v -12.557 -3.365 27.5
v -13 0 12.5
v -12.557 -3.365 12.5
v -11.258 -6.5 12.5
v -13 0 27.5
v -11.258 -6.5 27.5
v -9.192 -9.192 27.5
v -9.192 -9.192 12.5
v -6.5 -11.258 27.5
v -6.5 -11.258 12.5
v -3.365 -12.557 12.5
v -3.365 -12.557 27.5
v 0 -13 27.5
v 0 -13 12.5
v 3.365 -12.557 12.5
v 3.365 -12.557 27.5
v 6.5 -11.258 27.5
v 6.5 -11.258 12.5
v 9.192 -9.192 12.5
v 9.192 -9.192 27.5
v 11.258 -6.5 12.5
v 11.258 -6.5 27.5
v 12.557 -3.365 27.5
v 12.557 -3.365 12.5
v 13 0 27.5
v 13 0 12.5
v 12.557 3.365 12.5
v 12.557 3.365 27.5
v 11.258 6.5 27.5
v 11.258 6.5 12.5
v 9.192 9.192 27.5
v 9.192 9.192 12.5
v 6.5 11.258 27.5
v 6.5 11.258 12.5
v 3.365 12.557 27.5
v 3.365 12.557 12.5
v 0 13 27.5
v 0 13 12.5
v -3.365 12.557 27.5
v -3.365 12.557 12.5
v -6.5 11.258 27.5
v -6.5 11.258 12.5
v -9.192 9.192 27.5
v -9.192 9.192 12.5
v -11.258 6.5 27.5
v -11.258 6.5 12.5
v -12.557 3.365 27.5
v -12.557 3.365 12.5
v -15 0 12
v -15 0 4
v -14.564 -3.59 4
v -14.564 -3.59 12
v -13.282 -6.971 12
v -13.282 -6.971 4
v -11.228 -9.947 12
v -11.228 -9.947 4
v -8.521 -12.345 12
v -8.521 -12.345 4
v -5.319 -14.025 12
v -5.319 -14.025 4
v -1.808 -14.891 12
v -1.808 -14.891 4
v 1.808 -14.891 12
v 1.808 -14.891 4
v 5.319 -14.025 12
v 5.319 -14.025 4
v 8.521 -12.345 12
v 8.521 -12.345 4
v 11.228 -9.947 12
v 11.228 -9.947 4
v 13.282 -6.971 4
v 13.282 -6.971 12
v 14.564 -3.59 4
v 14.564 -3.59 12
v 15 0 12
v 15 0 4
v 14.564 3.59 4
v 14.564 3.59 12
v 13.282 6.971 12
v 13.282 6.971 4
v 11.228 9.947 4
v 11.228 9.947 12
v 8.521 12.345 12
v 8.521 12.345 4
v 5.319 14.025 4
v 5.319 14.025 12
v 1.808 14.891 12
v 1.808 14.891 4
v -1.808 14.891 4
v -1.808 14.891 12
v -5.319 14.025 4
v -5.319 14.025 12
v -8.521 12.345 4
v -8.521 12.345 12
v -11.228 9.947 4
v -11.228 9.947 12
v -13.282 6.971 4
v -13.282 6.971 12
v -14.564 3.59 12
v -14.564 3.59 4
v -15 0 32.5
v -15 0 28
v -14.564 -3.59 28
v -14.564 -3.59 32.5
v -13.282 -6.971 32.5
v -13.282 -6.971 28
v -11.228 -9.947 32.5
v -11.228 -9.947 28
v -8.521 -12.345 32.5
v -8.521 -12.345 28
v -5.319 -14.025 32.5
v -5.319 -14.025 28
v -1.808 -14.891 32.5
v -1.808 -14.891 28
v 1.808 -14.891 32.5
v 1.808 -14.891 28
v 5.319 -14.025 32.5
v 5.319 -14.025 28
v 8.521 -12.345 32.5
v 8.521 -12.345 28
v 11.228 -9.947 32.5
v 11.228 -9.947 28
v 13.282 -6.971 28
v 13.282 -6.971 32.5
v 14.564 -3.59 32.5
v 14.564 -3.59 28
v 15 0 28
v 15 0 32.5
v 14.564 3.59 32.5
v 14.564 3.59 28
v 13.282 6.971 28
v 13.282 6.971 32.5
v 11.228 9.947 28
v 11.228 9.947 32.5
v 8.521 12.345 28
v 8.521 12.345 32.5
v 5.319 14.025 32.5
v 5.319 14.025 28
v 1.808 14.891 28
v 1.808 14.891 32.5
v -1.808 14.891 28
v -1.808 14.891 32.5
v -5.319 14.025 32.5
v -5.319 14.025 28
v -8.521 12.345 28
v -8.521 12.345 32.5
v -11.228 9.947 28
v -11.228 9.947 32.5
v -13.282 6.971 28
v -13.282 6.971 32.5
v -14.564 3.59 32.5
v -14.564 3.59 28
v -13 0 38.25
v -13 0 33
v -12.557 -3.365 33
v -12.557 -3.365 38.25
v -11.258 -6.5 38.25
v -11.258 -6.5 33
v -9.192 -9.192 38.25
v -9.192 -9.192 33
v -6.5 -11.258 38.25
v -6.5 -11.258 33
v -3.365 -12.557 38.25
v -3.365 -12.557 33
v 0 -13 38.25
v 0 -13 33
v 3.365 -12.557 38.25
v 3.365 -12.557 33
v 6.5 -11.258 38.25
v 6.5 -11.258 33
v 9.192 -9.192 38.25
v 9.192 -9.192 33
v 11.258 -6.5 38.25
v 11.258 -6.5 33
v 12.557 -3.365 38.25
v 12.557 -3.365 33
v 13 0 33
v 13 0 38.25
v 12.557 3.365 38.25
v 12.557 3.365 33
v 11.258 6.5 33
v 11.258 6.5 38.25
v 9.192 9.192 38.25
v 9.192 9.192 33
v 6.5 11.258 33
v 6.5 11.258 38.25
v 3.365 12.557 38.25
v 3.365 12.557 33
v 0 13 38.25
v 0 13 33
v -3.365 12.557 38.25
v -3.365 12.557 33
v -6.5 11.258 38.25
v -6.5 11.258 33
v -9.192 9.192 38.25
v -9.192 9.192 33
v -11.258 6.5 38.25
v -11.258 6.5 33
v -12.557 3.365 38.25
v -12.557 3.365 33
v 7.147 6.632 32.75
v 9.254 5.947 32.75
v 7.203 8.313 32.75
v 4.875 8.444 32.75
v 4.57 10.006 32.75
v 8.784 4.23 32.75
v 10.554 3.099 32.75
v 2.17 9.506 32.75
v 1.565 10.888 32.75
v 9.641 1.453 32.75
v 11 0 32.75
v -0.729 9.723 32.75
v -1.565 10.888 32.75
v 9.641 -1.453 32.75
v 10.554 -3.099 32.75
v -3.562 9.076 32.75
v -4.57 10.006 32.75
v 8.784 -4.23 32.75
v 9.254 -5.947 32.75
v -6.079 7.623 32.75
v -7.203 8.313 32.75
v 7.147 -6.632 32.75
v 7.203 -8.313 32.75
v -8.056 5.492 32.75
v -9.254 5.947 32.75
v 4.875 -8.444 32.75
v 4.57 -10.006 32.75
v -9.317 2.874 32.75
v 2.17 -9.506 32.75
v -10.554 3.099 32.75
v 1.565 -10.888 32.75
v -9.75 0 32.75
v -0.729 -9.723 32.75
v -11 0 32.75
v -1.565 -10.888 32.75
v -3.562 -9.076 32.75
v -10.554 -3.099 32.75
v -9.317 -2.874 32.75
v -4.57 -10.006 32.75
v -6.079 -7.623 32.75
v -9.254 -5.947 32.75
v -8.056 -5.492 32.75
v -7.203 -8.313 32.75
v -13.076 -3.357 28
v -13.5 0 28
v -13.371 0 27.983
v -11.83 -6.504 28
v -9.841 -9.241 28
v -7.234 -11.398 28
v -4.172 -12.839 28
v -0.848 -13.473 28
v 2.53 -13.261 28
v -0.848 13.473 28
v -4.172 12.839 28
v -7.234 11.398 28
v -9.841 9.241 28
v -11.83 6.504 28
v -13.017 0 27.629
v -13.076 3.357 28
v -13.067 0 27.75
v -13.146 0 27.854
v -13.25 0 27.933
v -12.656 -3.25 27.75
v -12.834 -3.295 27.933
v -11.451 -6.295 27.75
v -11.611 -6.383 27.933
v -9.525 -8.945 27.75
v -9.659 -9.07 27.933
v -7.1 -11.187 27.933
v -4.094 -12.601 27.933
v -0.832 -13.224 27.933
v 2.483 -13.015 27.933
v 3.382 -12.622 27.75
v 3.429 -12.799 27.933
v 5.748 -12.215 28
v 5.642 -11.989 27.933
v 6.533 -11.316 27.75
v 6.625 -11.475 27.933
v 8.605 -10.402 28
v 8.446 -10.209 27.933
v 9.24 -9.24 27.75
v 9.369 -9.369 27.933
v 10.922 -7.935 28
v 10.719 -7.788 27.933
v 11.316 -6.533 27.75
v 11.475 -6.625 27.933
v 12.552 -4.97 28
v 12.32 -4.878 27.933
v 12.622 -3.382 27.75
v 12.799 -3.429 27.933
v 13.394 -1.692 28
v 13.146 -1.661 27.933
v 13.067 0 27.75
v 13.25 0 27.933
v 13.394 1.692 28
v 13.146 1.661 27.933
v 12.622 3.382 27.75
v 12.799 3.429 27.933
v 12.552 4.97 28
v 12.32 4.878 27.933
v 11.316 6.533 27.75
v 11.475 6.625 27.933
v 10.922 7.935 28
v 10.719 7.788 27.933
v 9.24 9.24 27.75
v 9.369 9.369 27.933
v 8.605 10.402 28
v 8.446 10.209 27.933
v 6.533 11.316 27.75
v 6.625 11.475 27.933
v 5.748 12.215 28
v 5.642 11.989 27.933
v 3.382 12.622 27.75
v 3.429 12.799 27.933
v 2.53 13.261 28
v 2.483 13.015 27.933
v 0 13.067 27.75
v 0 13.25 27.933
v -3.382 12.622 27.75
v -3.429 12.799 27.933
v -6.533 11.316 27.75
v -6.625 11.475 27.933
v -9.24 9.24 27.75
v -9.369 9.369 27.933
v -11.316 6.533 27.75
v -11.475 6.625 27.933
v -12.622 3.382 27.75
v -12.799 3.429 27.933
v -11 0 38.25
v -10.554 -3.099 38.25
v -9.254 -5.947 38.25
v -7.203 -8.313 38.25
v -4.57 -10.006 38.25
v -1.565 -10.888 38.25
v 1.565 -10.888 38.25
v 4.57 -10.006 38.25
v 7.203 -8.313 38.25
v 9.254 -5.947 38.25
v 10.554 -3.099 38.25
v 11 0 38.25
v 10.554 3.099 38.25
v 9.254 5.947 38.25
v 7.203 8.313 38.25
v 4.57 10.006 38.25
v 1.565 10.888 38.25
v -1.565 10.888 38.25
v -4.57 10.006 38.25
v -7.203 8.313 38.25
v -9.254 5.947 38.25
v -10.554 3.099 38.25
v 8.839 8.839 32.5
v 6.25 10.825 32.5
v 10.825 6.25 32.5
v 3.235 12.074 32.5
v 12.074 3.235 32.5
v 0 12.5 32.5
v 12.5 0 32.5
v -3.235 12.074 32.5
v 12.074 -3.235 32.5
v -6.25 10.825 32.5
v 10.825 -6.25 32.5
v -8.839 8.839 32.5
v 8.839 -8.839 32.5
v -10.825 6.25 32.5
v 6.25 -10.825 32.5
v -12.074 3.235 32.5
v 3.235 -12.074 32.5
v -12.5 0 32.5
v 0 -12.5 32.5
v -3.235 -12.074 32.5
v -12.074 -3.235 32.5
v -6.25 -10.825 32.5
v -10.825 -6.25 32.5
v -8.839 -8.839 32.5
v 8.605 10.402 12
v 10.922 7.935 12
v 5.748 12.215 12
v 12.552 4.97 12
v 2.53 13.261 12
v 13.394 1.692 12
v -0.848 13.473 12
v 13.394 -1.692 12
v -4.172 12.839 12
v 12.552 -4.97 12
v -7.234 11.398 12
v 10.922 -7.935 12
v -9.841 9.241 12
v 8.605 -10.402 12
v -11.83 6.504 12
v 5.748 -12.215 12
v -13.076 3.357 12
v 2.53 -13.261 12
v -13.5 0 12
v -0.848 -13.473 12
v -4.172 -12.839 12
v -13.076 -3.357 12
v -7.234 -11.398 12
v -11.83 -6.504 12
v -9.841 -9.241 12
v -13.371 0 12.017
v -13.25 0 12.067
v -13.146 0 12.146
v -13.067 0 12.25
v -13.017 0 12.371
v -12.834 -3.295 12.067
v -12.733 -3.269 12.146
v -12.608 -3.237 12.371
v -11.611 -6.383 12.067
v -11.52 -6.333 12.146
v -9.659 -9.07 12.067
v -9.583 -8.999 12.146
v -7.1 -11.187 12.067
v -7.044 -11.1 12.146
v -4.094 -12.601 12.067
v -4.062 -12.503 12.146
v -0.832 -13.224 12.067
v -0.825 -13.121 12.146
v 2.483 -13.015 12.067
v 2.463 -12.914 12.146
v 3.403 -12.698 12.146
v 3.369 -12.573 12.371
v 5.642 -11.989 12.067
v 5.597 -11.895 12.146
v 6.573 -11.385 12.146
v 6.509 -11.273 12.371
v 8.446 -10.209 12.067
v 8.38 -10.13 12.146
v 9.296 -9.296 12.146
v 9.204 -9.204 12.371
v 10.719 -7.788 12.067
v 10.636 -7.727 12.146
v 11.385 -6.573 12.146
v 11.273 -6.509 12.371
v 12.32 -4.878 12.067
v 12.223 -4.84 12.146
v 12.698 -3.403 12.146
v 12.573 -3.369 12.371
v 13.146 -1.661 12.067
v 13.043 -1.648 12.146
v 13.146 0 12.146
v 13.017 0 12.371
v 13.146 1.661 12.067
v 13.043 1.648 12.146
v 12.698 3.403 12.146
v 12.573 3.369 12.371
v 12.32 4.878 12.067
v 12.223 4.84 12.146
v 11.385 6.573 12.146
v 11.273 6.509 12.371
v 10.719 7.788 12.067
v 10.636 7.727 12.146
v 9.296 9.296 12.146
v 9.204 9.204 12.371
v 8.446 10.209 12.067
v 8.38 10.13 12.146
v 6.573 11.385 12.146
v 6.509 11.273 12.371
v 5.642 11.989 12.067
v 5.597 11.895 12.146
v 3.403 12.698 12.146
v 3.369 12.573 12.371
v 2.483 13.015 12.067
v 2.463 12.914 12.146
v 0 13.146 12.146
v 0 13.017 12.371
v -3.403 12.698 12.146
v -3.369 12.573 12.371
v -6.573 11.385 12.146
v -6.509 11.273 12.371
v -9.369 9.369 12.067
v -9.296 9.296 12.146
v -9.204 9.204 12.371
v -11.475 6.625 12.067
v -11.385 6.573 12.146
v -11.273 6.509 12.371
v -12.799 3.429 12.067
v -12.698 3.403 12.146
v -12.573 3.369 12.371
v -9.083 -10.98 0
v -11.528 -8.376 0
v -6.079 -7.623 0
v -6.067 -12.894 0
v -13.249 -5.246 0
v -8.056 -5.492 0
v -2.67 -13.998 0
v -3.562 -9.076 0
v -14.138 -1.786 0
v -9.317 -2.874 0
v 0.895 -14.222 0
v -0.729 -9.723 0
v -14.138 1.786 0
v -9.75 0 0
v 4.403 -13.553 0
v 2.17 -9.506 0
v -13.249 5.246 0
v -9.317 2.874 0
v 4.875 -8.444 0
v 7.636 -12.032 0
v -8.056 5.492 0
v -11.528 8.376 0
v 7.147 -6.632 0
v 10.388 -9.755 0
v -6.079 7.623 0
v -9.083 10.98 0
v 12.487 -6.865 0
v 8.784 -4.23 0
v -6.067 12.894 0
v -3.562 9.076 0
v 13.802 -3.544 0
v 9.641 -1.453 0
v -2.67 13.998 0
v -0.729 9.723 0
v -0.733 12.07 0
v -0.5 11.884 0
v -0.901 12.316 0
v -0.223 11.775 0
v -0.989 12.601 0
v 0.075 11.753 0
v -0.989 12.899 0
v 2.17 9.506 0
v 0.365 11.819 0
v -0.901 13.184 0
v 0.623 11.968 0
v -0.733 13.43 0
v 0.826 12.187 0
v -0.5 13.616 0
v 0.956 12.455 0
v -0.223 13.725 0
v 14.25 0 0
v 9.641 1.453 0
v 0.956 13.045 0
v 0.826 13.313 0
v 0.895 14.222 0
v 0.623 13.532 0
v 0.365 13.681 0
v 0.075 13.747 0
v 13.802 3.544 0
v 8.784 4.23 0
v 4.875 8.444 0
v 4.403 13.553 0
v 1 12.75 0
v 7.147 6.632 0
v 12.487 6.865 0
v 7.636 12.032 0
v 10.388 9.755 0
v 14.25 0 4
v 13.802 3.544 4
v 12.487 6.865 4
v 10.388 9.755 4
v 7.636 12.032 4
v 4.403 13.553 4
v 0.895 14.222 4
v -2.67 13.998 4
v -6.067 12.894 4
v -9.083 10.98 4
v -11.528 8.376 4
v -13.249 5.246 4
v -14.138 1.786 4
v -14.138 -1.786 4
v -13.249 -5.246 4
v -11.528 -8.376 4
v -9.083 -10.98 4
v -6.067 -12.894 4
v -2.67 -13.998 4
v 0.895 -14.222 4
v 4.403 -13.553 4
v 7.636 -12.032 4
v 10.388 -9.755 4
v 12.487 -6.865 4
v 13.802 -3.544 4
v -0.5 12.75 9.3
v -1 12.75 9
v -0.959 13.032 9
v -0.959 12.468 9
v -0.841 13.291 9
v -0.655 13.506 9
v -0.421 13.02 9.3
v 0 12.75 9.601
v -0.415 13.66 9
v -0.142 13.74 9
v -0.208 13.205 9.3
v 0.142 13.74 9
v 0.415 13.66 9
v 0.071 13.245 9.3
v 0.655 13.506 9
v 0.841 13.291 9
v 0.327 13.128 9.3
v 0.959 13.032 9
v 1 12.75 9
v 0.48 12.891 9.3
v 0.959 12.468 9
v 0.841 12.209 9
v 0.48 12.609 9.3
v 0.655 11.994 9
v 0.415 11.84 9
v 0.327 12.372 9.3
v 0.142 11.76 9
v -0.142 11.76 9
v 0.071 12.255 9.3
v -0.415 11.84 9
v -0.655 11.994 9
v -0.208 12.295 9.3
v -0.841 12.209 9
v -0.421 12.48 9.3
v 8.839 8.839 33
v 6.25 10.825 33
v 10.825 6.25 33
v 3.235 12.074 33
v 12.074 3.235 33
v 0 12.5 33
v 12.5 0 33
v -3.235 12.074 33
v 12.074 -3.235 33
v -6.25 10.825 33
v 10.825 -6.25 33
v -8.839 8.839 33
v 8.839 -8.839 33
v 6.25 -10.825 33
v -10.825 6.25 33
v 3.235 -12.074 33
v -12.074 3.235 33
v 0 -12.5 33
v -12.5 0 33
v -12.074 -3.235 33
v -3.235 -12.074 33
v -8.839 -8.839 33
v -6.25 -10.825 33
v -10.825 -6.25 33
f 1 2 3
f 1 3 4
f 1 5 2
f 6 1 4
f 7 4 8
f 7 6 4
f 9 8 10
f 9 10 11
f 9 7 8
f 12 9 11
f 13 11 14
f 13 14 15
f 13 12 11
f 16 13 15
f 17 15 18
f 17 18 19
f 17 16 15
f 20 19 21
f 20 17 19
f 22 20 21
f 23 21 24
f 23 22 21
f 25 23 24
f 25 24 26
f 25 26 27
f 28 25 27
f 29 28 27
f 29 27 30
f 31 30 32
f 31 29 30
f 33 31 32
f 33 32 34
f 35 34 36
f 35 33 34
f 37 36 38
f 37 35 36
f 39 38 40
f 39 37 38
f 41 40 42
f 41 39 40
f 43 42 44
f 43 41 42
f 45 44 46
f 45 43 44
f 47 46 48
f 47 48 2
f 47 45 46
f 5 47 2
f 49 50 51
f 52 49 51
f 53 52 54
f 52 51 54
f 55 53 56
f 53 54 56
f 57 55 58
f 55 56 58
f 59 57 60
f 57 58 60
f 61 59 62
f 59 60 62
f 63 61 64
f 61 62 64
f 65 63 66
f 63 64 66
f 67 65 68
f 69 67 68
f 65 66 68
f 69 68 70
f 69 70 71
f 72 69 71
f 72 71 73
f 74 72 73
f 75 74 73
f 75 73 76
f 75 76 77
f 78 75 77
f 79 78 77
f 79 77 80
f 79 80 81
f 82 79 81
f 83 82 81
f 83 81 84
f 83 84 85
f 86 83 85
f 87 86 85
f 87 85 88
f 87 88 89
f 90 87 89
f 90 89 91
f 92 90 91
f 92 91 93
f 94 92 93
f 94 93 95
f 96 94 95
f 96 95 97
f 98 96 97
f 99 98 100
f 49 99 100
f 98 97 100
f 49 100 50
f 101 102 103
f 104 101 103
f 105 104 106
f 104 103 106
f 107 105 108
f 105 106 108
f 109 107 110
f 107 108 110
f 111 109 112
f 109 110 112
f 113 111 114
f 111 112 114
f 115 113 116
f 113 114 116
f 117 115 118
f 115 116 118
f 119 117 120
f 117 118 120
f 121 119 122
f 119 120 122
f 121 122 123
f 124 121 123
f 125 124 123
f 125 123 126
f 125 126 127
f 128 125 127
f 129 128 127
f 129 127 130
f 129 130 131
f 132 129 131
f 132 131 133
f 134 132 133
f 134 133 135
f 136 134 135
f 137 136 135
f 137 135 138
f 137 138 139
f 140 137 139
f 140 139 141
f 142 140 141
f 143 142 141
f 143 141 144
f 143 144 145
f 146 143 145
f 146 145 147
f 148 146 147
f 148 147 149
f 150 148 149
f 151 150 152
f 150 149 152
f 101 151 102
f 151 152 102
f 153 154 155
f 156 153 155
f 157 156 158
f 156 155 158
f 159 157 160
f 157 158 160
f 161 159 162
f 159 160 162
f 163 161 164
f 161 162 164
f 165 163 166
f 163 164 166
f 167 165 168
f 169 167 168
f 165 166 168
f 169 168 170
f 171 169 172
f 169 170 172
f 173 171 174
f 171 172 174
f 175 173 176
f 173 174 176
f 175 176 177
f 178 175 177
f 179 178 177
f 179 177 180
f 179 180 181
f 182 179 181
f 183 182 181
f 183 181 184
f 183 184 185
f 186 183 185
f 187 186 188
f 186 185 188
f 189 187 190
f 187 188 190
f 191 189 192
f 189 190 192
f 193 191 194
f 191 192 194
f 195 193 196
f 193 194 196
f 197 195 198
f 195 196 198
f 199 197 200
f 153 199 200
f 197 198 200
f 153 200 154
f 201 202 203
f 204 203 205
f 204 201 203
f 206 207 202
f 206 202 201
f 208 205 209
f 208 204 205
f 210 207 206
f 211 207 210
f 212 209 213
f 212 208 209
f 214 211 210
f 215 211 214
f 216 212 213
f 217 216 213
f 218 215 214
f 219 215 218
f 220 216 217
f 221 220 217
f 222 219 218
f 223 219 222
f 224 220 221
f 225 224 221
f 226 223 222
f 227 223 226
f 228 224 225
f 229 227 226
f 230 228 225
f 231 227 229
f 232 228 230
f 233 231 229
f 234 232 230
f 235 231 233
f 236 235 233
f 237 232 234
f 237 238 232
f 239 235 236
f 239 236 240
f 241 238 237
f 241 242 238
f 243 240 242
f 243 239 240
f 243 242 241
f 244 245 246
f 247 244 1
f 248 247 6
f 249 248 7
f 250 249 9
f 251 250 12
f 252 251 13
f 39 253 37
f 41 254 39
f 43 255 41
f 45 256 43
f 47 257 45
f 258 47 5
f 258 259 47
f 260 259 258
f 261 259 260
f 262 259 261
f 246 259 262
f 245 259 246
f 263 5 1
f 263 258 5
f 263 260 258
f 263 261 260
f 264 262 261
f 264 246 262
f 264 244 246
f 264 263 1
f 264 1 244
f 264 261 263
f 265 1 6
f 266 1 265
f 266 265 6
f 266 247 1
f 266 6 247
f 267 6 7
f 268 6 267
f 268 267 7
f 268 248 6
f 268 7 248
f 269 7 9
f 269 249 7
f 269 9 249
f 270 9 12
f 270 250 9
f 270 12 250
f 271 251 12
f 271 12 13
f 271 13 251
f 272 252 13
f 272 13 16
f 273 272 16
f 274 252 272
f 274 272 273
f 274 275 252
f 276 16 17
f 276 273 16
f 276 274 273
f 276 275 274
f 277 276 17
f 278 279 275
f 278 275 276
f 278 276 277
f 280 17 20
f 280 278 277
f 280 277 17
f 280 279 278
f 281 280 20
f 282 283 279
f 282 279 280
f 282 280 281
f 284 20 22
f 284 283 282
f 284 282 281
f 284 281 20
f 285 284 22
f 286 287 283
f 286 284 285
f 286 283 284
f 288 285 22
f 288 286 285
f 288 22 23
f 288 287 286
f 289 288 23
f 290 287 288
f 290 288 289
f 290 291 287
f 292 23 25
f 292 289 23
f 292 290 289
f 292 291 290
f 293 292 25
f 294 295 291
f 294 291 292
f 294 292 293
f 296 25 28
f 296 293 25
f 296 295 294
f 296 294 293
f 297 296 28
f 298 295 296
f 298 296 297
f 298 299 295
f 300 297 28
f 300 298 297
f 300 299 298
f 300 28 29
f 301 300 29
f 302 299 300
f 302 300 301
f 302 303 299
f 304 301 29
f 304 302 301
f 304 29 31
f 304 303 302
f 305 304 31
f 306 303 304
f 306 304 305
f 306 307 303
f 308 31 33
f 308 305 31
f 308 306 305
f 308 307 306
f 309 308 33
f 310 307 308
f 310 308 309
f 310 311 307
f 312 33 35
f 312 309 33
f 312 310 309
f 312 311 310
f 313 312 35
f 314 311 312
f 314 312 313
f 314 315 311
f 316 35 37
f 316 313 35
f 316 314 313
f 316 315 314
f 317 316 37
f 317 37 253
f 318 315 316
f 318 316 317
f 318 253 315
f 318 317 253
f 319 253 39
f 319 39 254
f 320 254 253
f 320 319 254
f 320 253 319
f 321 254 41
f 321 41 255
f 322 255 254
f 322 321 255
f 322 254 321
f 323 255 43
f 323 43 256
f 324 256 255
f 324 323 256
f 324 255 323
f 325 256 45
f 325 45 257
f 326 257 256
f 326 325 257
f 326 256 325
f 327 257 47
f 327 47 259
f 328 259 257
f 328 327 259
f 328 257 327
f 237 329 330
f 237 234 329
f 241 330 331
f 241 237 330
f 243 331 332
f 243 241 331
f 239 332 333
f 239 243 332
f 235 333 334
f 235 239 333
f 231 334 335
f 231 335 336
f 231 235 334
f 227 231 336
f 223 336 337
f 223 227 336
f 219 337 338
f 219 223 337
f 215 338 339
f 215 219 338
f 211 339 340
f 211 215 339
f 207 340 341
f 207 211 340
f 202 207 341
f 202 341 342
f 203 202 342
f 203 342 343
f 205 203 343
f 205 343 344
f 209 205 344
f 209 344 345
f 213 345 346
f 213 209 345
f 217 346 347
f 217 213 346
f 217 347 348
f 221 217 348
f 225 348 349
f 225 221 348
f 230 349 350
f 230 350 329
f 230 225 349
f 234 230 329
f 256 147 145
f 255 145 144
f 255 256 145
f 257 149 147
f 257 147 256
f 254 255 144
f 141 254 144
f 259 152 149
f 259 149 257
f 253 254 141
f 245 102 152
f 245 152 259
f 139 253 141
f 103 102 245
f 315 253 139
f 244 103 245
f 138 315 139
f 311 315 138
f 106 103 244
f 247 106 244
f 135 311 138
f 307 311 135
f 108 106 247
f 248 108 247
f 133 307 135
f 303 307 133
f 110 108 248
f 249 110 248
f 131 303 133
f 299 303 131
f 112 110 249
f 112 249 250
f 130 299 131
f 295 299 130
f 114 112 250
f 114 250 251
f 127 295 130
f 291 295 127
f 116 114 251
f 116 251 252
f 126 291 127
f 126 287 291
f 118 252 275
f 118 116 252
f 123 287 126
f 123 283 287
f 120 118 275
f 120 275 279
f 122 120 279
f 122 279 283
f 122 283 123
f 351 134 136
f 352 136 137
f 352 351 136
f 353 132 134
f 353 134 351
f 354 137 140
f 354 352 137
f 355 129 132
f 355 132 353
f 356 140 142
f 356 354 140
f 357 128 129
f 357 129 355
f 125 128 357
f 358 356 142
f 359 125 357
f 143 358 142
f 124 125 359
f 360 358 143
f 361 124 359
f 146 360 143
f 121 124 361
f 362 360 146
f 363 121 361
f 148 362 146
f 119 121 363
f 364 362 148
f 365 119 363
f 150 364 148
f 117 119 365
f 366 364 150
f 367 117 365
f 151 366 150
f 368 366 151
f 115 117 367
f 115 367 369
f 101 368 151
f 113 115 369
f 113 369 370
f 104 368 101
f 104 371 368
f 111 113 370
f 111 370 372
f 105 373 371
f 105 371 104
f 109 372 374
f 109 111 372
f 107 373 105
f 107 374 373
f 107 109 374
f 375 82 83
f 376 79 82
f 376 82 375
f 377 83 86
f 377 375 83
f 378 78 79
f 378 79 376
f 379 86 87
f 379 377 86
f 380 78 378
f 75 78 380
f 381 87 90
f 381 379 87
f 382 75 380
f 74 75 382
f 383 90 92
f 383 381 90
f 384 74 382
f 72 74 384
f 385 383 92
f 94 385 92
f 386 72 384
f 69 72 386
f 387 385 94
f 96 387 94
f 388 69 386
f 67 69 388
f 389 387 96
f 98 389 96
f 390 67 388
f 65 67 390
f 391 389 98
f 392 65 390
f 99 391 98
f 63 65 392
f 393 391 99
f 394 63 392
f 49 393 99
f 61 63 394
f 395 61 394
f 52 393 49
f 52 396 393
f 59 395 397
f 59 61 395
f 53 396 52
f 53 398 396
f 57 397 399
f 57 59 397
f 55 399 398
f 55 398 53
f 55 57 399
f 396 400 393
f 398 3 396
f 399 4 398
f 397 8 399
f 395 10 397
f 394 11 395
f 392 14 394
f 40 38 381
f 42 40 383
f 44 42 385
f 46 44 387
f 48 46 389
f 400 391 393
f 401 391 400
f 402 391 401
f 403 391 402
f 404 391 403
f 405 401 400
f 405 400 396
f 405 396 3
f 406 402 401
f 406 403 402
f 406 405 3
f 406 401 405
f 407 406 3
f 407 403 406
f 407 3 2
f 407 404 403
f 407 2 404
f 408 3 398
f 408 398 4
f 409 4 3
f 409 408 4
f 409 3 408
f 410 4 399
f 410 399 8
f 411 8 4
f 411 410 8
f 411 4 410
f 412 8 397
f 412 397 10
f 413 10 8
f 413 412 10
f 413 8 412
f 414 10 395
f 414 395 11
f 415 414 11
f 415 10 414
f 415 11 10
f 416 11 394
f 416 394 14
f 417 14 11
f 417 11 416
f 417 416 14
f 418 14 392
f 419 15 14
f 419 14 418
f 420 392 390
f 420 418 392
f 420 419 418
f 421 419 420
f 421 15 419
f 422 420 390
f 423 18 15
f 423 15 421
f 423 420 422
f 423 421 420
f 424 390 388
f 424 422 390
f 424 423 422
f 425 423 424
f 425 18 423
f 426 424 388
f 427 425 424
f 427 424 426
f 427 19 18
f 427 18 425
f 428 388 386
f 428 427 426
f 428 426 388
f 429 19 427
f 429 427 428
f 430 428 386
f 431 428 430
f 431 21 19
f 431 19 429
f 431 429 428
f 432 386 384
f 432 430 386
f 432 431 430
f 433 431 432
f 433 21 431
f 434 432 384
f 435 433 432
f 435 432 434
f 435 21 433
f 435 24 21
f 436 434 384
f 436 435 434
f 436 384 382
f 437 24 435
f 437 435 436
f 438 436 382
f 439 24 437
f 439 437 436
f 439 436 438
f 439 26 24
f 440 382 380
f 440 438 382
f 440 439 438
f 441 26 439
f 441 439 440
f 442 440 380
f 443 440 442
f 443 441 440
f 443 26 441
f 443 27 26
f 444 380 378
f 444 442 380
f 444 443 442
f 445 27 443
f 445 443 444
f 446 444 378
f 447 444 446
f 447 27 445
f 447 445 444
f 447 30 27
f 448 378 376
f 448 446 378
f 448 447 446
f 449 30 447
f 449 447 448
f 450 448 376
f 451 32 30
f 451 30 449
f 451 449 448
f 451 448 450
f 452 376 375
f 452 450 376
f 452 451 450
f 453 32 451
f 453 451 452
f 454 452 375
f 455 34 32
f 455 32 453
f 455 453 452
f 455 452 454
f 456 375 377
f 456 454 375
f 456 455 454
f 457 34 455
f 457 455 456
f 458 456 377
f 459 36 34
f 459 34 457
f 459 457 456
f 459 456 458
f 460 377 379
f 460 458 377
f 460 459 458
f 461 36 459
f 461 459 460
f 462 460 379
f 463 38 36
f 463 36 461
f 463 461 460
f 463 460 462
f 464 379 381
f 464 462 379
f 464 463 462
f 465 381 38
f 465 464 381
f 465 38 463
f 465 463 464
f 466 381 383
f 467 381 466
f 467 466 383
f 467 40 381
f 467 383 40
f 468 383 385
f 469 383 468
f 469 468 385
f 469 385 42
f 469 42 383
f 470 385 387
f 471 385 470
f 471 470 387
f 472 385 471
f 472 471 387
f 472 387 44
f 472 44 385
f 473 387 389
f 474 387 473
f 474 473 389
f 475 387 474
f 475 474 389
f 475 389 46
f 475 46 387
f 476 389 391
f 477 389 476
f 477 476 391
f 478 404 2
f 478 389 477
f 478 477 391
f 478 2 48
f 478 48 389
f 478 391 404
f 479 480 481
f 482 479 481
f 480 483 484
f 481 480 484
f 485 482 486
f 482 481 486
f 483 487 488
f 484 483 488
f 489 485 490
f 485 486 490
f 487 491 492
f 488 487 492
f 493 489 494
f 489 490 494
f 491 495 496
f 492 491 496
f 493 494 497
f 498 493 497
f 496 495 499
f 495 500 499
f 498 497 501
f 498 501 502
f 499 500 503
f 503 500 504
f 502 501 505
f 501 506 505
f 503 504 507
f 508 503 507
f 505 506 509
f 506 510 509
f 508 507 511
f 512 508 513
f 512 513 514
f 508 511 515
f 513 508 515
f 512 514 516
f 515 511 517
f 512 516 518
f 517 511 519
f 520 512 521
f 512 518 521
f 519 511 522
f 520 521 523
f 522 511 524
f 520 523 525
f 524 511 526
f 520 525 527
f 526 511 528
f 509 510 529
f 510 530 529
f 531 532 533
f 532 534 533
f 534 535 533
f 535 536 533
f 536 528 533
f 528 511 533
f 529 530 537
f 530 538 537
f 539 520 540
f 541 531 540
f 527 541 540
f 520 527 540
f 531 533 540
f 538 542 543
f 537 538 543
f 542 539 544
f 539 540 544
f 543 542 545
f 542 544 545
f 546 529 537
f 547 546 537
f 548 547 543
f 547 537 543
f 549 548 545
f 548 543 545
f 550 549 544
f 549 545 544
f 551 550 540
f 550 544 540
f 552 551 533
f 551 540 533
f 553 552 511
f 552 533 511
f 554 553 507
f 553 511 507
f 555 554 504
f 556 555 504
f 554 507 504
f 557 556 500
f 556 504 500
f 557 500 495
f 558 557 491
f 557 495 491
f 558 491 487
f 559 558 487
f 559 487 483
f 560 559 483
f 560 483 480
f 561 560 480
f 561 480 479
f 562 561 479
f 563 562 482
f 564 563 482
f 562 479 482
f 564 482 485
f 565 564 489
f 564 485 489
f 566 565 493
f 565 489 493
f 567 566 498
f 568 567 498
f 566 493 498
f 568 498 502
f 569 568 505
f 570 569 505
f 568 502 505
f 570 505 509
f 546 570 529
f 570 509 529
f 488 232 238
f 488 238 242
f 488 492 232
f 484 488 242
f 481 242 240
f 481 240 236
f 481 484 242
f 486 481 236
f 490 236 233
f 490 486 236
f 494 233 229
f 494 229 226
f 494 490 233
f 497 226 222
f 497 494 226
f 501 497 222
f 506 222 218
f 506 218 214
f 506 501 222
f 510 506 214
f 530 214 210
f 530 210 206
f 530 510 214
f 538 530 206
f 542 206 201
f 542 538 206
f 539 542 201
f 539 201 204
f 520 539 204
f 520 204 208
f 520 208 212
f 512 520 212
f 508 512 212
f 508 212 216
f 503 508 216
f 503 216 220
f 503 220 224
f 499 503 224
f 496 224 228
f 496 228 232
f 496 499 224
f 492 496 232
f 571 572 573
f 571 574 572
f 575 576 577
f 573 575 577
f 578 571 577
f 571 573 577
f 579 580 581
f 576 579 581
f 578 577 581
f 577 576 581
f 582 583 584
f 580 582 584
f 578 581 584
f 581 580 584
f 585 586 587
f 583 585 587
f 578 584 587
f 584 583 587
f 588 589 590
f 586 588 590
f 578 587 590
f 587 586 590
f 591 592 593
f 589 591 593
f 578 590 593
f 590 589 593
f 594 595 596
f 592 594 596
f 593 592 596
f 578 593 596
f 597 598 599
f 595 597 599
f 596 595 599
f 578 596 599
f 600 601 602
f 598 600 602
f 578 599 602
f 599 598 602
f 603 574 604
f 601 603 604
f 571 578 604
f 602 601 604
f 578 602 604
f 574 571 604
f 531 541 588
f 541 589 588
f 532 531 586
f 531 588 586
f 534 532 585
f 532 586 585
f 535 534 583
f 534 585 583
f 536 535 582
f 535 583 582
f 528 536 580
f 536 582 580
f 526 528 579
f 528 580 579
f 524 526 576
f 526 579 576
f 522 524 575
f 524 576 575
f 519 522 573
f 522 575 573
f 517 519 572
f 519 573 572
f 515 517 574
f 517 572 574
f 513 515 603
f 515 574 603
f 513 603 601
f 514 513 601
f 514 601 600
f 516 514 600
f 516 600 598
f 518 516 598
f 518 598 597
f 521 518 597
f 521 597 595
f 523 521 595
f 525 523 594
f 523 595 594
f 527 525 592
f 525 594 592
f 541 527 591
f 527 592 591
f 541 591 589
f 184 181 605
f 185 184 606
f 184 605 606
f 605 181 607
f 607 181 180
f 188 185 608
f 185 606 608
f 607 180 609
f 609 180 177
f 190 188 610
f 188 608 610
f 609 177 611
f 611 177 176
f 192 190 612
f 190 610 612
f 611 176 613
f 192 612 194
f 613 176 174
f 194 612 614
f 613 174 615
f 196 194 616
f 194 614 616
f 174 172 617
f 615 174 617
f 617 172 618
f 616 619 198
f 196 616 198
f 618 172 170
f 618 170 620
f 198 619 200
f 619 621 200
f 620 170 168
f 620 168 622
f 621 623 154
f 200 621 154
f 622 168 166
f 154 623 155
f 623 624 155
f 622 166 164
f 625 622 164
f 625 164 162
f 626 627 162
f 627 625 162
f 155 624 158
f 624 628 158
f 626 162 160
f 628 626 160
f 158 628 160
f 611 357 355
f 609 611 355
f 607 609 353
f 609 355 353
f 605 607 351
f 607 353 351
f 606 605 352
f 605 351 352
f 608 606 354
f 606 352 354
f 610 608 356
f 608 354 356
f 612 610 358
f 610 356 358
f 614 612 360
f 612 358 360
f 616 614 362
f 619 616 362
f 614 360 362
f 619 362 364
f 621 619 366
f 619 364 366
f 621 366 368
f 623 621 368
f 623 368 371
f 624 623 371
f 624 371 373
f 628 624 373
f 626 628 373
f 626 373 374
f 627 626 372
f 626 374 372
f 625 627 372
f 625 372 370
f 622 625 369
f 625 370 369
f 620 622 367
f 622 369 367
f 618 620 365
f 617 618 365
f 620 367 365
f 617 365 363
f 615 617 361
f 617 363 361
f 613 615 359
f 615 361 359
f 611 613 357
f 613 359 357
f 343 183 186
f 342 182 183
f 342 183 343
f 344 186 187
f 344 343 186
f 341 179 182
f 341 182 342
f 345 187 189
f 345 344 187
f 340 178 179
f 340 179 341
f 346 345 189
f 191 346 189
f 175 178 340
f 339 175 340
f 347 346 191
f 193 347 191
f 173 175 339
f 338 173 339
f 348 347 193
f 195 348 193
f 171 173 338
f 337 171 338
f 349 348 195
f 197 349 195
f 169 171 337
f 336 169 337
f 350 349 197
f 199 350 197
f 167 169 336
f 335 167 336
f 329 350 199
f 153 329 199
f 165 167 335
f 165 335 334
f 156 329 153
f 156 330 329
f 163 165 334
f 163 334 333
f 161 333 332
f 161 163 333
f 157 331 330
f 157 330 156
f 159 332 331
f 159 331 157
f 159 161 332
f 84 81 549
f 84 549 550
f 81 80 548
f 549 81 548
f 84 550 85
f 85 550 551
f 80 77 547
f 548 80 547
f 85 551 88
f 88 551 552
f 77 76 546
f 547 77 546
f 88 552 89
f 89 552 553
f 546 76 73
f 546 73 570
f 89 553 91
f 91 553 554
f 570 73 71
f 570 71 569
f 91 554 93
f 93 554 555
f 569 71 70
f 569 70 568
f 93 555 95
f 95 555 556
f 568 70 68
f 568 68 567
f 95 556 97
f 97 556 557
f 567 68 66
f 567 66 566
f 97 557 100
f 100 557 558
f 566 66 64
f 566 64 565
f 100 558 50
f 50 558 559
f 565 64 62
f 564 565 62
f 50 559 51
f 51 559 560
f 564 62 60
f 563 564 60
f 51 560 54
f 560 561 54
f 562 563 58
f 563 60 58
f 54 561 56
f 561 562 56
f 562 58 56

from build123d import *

# Parameters (mm, degrees)
ESQUISSE1_R                       = 14.25
BOSS_EXTRU_1_DEPTH                = 4
ESQUISSE2_R                       = 15
BOSS_EXTRU_2_DEPTH                = 28.5
ESQUISSE3_R                       = 12.5
BOSS_EXTRU_3_DEPTH                = 0.5
ESQUISSE4_R                       = 13
BOSS_EXTRU_4_DEPTH                = 5.25
DIAM_TRE_DU_PER_AGE_2_0_2_1_D     = 2
DIAM_TRE_DU_PER_AGE_2_0_2_1_DEPTH = 9
DIAM_TRE_DU_PER_AGE_2_0_2_1_TIP   = 0.600860619


with BuildPart() as part:
    # Esquisse1 → Boss.-Extru.1 (new body)
    with BuildSketch(Plane.XY):
        Circle(ESQUISSE1_R)
    extrude(amount=BOSS_EXTRU_1_DEPTH)

    # Esquisse2 → Boss.-Extru.2 (add)
    with BuildSketch(Plane.XY.offset(4)):
        with Locations(Location((0, 0, 0), (0, 0, 180))):
            Circle(ESQUISSE2_R)
    extrude(amount=BOSS_EXTRU_2_DEPTH)

    # Esquisse3 → Boss.-Extru.3 (add)
    with BuildSketch(Plane.XY.offset(32.5)):
        Circle(ESQUISSE3_R)
    extrude(amount=BOSS_EXTRU_3_DEPTH)

    # Esquisse4 → Boss.-Extru.4 (add)
    with BuildSketch(Plane.XY.offset(33)):
        with Locations(Location((0, 0, 0), (0, 0, 180))):
            Circle(ESQUISSE4_R)
    extrude(amount=BOSS_EXTRU_4_DEPTH)

    # Esquisse5 → Enlèvement de matière-Révolution1 (revolve, cut)
    with BuildSketch(Plane(origin=(0, 0, 0), x_dir=(0, 0, -1), z_dir=(1, 0, 0)), mode=Mode.PRIVATE) as enl_vement_de_mati_re_r_volution1_sk:
        Polygon((0, 0), (-38.25, 0), (-38.25, 11), (-32.75, 11), (-32.75, 9.75), (0, 9.75), align=None)
        with BuildLine():
            Line((-28, 15), (-12, 15))
            Line((-12, 15), (-12, 13.5))
            ThreePointArc((-12, 13.5), (-12.146446609, 13.146446609), (-12.5, 13))
            Line((-12.5, 13), (-27.5, 13))
            ThreePointArc((-27.5, 13), (-27.853553391, 13.146446609), (-28, 13.5))
            Line((-28, 13.5), (-28, 15))
        make_face()
    revolve(enl_vement_de_mati_re_r_volution1_sk.sketch.rotate(Axis((0, 0, 0), (0, 0, 1)), 90), axis=Axis((0, 0, 0), (0, 0, 1)), mode=Mode.SUBTRACT)

    # Diamètre du perçage Ø2.0 (2)1
    with Locations(Plane(origin=(0, 0, 0), x_dir=(-1, 0, 0), z_dir=(0, 0, -1))):
        with Locations((0, 12.75)):
            Hole(DIAM_TRE_DU_PER_AGE_2_0_2_1_D / 2, depth=DIAM_TRE_DU_PER_AGE_2_0_2_1_DEPTH)
            with Locations((0, 0, -(DIAM_TRE_DU_PER_AGE_2_0_2_1_DEPTH + DIAM_TRE_DU_PER_AGE_2_0_2_1_TIP / 2))):  # 118° drill point
                Cone(0, DIAM_TRE_DU_PER_AGE_2_0_2_1_D / 2, DIAM_TRE_DU_PER_AGE_2_0_2_1_TIP, mode=Mode.SUBTRACT)


solid = part.part
